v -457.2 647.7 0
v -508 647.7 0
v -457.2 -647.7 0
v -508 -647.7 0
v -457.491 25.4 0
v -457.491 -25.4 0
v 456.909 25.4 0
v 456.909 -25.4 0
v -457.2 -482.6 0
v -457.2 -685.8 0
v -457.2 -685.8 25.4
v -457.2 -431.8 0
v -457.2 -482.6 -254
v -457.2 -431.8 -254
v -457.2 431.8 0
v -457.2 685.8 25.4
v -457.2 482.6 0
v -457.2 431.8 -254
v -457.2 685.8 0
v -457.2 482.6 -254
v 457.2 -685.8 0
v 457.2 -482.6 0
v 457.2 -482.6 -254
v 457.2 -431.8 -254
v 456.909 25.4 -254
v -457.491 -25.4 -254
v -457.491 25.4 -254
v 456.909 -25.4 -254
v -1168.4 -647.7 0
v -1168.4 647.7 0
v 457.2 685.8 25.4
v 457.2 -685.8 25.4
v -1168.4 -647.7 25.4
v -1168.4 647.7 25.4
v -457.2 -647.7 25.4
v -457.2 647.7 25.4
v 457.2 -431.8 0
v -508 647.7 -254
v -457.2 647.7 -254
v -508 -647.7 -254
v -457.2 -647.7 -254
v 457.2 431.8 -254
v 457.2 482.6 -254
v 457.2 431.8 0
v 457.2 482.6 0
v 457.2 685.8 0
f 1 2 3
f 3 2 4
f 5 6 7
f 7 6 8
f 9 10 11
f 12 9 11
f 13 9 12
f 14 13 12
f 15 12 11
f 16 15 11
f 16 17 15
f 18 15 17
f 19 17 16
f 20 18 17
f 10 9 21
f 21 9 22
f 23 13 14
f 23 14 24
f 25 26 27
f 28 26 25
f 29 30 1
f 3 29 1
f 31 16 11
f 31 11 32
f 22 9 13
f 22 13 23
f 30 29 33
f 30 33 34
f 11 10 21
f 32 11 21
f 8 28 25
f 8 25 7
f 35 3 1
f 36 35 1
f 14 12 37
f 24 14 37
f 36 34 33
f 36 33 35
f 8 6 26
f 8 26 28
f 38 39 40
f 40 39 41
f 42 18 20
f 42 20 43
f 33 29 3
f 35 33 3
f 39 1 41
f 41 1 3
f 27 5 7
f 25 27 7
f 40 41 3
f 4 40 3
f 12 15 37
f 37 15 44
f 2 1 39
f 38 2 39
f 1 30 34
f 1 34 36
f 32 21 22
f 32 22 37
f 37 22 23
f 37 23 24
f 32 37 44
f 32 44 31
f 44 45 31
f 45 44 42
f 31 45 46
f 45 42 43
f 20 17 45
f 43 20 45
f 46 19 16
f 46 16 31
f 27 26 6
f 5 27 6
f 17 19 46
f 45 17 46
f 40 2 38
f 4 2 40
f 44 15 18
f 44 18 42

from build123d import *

# Parameters (mm, degrees)
F0_W      = 914.4
F0_H      = 1371.6
F1_DEPTH  = 25.4
F2_W      = 660.4
F2_H      = 1295.4
F3_DEPTH  = 25.4
F4_W      = 914.4
F4_H      = 254
F5_DEPTH  = 25.4
F6_W      = 914.4
F6_H      = 50.8
F7_DEPTH  = 254
F9_W      = 165.1
F9_H      = 254
F9_W_2    = 863.6
F10_DEPTH = 50.8
F11_W     = 1295.4
F11_H     = 25.4
F12_DEPTH = 50.8
F13_W     = 711.2
F13_H     = 1295.4
F14_DEPTH = 25.4


with BuildPart() as f1:
    # F0 (on Top) → F1 (new body)
    with BuildSketch(Plane.XY):
        Rectangle(F0_W, F0_H)
    extrude(amount=F1_DEPTH)

    # F6 (on face) → F7 (join)
    with BuildSketch(Plane(origin=(0, 0, 0), x_dir=(1, 0, 0), z_dir=(0, 0, -1))):
        with Locations((0, 457.2)):
            Rectangle(F6_W, F6_H)
        with Locations((0, -457.2)):
            Rectangle(F6_W, F6_H)
    extrude(amount=F7_DEPTH)


with BuildPart() as f3:
    # F2 (on Top) → F3 (new body)
    with BuildSketch(Plane.XY):
        with Locations((-993.5793445587, 28.9456365585)):
            Rectangle(F2_W, F2_H)
    extrude(amount=F3_DEPTH)


with BuildPart() as f5:
    # F4 (on Front) → F5 (new body, symmetric)
    with BuildSketch(Plane.XZ):
        with Locations((-0.2912971497, -127)):
            Rectangle(F4_W, F4_H)
    extrude(amount=F5_DEPTH, both=True)


with BuildPart() as f10:
    # F9 (on face) → F10 (new body)
    with BuildSketch(Plane(origin=(-457.2, 0, 0), x_dir=(0, -1, 0), z_dir=(-1, 0, 0))):
        Polygon((647.7, 25.4), (-647.7, 25.4), (-647.7, 0), (-482.6, 0), (-482.6, -254), (-431.8, -254), (-431.8, 0), (431.8, 0), (431.8, -254), (482.6, -254), (482.6, 0), (647.7, 0), align=None)
        Polygon((-482.6, 0), (-647.7, 0), (-647.7, -174.1451999916), (-647.7, -254), (-482.6, -254), align=None)
        with Locations((565.15, -127)):
            Rectangle(F9_W, F9_H)
        with Locations((0, -127)):
            Rectangle(F9_W_2, F9_H)
    extrude(amount=F10_DEPTH)

    # F11 (on face) → F12 (cut)
    with BuildSketch(Plane(origin=(-508, 0, 0), x_dir=(0, -1, 0), z_dir=(-1, 0, 0))):
        with Locations((0, 12.7)):
            Rectangle(F11_W, F11_H)
    extrude(amount=-F12_DEPTH, mode=Mode.SUBTRACT)


with BuildPart() as f14:
    # F13 (on face) → F14 (new body)
    with BuildSketch(Plane.XY):
        with Locations((-812.8, 0)):
            Rectangle(F13_W, F13_H)
    extrude(amount=F14_DEPTH)


solid = Compound([f1.part, f5.part, f10.part, f14.part])
